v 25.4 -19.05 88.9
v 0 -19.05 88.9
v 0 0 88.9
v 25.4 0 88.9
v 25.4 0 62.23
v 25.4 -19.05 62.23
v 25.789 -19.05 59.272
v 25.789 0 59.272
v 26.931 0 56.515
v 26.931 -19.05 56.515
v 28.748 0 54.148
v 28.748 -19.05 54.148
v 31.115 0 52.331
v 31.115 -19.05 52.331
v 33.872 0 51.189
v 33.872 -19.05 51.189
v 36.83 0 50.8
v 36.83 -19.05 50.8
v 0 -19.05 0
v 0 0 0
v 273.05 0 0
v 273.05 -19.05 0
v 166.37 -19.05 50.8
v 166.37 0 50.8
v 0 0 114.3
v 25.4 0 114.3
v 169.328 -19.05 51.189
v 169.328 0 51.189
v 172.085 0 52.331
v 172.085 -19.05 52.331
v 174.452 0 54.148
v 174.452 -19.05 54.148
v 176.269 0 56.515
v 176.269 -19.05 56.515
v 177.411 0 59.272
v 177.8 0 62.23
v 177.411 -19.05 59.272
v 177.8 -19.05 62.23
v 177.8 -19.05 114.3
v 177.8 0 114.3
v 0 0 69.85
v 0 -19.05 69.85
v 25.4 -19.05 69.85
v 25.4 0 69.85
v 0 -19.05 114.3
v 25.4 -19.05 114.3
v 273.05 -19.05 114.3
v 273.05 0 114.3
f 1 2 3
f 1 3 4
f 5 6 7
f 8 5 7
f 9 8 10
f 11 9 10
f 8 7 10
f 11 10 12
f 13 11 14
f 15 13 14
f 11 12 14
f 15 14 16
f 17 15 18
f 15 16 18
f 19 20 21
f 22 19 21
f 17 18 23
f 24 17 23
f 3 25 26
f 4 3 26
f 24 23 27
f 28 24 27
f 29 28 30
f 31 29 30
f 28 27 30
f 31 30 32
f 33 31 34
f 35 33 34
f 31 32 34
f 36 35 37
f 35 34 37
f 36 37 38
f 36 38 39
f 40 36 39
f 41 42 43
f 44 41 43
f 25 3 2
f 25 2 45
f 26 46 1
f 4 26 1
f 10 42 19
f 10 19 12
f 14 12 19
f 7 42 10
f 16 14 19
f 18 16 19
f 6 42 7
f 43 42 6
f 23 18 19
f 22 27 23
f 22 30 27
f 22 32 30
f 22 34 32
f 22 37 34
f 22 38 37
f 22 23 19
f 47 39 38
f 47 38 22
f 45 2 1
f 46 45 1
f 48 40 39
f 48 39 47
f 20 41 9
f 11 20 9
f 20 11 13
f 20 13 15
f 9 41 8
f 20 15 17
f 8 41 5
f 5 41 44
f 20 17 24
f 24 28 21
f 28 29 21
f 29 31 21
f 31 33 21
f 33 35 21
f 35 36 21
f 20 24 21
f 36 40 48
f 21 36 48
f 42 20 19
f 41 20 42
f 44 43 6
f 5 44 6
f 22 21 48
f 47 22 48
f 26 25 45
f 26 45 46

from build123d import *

# Parameters (mm, degrees)
F0_W     = 273.05
F0_H     = 114.3
F1_DEPTH = 19.05
F2_W     = 25.4
F2_H     = 19.05
F3_DEPTH = 25.4


with BuildPart() as f1:
    # F0 (on Front) → F1 (new body)
    with BuildSketch(Plane.XZ):
        with Locations((136.525, 57.15)):
            Rectangle(F0_W, F0_H)
    extrude(amount=F1_DEPTH)

    # F2 (on face) → F3 (cut)
    with BuildSketch(Plane.XZ.offset(19.05)):
        with Locations((12.7, 79.375)):
            Rectangle(F2_W, F2_H)
        with BuildLine():
            Line((25.4, 114.3), (25.4, 88.9))
            Line((25.4, 88.9), (25.4, 69.85))
            Line((25.4, 69.85), (25.4, 62.23))
            ThreePointArc((25.4, 62.23), (28.747769, 54.147769), (36.83, 50.8))
            Line((36.83, 50.8), (166.37, 50.8))
            ThreePointArc((166.37, 50.8), (174.452231, 54.147769), (177.8, 62.23))
            Line((177.8, 62.23), (177.8, 114.3))
            Line((177.8, 114.3), (25.4, 114.3))
        make_face()
    extrude(amount=-F3_DEPTH, mode=Mode.SUBTRACT)


solid = f1.part
